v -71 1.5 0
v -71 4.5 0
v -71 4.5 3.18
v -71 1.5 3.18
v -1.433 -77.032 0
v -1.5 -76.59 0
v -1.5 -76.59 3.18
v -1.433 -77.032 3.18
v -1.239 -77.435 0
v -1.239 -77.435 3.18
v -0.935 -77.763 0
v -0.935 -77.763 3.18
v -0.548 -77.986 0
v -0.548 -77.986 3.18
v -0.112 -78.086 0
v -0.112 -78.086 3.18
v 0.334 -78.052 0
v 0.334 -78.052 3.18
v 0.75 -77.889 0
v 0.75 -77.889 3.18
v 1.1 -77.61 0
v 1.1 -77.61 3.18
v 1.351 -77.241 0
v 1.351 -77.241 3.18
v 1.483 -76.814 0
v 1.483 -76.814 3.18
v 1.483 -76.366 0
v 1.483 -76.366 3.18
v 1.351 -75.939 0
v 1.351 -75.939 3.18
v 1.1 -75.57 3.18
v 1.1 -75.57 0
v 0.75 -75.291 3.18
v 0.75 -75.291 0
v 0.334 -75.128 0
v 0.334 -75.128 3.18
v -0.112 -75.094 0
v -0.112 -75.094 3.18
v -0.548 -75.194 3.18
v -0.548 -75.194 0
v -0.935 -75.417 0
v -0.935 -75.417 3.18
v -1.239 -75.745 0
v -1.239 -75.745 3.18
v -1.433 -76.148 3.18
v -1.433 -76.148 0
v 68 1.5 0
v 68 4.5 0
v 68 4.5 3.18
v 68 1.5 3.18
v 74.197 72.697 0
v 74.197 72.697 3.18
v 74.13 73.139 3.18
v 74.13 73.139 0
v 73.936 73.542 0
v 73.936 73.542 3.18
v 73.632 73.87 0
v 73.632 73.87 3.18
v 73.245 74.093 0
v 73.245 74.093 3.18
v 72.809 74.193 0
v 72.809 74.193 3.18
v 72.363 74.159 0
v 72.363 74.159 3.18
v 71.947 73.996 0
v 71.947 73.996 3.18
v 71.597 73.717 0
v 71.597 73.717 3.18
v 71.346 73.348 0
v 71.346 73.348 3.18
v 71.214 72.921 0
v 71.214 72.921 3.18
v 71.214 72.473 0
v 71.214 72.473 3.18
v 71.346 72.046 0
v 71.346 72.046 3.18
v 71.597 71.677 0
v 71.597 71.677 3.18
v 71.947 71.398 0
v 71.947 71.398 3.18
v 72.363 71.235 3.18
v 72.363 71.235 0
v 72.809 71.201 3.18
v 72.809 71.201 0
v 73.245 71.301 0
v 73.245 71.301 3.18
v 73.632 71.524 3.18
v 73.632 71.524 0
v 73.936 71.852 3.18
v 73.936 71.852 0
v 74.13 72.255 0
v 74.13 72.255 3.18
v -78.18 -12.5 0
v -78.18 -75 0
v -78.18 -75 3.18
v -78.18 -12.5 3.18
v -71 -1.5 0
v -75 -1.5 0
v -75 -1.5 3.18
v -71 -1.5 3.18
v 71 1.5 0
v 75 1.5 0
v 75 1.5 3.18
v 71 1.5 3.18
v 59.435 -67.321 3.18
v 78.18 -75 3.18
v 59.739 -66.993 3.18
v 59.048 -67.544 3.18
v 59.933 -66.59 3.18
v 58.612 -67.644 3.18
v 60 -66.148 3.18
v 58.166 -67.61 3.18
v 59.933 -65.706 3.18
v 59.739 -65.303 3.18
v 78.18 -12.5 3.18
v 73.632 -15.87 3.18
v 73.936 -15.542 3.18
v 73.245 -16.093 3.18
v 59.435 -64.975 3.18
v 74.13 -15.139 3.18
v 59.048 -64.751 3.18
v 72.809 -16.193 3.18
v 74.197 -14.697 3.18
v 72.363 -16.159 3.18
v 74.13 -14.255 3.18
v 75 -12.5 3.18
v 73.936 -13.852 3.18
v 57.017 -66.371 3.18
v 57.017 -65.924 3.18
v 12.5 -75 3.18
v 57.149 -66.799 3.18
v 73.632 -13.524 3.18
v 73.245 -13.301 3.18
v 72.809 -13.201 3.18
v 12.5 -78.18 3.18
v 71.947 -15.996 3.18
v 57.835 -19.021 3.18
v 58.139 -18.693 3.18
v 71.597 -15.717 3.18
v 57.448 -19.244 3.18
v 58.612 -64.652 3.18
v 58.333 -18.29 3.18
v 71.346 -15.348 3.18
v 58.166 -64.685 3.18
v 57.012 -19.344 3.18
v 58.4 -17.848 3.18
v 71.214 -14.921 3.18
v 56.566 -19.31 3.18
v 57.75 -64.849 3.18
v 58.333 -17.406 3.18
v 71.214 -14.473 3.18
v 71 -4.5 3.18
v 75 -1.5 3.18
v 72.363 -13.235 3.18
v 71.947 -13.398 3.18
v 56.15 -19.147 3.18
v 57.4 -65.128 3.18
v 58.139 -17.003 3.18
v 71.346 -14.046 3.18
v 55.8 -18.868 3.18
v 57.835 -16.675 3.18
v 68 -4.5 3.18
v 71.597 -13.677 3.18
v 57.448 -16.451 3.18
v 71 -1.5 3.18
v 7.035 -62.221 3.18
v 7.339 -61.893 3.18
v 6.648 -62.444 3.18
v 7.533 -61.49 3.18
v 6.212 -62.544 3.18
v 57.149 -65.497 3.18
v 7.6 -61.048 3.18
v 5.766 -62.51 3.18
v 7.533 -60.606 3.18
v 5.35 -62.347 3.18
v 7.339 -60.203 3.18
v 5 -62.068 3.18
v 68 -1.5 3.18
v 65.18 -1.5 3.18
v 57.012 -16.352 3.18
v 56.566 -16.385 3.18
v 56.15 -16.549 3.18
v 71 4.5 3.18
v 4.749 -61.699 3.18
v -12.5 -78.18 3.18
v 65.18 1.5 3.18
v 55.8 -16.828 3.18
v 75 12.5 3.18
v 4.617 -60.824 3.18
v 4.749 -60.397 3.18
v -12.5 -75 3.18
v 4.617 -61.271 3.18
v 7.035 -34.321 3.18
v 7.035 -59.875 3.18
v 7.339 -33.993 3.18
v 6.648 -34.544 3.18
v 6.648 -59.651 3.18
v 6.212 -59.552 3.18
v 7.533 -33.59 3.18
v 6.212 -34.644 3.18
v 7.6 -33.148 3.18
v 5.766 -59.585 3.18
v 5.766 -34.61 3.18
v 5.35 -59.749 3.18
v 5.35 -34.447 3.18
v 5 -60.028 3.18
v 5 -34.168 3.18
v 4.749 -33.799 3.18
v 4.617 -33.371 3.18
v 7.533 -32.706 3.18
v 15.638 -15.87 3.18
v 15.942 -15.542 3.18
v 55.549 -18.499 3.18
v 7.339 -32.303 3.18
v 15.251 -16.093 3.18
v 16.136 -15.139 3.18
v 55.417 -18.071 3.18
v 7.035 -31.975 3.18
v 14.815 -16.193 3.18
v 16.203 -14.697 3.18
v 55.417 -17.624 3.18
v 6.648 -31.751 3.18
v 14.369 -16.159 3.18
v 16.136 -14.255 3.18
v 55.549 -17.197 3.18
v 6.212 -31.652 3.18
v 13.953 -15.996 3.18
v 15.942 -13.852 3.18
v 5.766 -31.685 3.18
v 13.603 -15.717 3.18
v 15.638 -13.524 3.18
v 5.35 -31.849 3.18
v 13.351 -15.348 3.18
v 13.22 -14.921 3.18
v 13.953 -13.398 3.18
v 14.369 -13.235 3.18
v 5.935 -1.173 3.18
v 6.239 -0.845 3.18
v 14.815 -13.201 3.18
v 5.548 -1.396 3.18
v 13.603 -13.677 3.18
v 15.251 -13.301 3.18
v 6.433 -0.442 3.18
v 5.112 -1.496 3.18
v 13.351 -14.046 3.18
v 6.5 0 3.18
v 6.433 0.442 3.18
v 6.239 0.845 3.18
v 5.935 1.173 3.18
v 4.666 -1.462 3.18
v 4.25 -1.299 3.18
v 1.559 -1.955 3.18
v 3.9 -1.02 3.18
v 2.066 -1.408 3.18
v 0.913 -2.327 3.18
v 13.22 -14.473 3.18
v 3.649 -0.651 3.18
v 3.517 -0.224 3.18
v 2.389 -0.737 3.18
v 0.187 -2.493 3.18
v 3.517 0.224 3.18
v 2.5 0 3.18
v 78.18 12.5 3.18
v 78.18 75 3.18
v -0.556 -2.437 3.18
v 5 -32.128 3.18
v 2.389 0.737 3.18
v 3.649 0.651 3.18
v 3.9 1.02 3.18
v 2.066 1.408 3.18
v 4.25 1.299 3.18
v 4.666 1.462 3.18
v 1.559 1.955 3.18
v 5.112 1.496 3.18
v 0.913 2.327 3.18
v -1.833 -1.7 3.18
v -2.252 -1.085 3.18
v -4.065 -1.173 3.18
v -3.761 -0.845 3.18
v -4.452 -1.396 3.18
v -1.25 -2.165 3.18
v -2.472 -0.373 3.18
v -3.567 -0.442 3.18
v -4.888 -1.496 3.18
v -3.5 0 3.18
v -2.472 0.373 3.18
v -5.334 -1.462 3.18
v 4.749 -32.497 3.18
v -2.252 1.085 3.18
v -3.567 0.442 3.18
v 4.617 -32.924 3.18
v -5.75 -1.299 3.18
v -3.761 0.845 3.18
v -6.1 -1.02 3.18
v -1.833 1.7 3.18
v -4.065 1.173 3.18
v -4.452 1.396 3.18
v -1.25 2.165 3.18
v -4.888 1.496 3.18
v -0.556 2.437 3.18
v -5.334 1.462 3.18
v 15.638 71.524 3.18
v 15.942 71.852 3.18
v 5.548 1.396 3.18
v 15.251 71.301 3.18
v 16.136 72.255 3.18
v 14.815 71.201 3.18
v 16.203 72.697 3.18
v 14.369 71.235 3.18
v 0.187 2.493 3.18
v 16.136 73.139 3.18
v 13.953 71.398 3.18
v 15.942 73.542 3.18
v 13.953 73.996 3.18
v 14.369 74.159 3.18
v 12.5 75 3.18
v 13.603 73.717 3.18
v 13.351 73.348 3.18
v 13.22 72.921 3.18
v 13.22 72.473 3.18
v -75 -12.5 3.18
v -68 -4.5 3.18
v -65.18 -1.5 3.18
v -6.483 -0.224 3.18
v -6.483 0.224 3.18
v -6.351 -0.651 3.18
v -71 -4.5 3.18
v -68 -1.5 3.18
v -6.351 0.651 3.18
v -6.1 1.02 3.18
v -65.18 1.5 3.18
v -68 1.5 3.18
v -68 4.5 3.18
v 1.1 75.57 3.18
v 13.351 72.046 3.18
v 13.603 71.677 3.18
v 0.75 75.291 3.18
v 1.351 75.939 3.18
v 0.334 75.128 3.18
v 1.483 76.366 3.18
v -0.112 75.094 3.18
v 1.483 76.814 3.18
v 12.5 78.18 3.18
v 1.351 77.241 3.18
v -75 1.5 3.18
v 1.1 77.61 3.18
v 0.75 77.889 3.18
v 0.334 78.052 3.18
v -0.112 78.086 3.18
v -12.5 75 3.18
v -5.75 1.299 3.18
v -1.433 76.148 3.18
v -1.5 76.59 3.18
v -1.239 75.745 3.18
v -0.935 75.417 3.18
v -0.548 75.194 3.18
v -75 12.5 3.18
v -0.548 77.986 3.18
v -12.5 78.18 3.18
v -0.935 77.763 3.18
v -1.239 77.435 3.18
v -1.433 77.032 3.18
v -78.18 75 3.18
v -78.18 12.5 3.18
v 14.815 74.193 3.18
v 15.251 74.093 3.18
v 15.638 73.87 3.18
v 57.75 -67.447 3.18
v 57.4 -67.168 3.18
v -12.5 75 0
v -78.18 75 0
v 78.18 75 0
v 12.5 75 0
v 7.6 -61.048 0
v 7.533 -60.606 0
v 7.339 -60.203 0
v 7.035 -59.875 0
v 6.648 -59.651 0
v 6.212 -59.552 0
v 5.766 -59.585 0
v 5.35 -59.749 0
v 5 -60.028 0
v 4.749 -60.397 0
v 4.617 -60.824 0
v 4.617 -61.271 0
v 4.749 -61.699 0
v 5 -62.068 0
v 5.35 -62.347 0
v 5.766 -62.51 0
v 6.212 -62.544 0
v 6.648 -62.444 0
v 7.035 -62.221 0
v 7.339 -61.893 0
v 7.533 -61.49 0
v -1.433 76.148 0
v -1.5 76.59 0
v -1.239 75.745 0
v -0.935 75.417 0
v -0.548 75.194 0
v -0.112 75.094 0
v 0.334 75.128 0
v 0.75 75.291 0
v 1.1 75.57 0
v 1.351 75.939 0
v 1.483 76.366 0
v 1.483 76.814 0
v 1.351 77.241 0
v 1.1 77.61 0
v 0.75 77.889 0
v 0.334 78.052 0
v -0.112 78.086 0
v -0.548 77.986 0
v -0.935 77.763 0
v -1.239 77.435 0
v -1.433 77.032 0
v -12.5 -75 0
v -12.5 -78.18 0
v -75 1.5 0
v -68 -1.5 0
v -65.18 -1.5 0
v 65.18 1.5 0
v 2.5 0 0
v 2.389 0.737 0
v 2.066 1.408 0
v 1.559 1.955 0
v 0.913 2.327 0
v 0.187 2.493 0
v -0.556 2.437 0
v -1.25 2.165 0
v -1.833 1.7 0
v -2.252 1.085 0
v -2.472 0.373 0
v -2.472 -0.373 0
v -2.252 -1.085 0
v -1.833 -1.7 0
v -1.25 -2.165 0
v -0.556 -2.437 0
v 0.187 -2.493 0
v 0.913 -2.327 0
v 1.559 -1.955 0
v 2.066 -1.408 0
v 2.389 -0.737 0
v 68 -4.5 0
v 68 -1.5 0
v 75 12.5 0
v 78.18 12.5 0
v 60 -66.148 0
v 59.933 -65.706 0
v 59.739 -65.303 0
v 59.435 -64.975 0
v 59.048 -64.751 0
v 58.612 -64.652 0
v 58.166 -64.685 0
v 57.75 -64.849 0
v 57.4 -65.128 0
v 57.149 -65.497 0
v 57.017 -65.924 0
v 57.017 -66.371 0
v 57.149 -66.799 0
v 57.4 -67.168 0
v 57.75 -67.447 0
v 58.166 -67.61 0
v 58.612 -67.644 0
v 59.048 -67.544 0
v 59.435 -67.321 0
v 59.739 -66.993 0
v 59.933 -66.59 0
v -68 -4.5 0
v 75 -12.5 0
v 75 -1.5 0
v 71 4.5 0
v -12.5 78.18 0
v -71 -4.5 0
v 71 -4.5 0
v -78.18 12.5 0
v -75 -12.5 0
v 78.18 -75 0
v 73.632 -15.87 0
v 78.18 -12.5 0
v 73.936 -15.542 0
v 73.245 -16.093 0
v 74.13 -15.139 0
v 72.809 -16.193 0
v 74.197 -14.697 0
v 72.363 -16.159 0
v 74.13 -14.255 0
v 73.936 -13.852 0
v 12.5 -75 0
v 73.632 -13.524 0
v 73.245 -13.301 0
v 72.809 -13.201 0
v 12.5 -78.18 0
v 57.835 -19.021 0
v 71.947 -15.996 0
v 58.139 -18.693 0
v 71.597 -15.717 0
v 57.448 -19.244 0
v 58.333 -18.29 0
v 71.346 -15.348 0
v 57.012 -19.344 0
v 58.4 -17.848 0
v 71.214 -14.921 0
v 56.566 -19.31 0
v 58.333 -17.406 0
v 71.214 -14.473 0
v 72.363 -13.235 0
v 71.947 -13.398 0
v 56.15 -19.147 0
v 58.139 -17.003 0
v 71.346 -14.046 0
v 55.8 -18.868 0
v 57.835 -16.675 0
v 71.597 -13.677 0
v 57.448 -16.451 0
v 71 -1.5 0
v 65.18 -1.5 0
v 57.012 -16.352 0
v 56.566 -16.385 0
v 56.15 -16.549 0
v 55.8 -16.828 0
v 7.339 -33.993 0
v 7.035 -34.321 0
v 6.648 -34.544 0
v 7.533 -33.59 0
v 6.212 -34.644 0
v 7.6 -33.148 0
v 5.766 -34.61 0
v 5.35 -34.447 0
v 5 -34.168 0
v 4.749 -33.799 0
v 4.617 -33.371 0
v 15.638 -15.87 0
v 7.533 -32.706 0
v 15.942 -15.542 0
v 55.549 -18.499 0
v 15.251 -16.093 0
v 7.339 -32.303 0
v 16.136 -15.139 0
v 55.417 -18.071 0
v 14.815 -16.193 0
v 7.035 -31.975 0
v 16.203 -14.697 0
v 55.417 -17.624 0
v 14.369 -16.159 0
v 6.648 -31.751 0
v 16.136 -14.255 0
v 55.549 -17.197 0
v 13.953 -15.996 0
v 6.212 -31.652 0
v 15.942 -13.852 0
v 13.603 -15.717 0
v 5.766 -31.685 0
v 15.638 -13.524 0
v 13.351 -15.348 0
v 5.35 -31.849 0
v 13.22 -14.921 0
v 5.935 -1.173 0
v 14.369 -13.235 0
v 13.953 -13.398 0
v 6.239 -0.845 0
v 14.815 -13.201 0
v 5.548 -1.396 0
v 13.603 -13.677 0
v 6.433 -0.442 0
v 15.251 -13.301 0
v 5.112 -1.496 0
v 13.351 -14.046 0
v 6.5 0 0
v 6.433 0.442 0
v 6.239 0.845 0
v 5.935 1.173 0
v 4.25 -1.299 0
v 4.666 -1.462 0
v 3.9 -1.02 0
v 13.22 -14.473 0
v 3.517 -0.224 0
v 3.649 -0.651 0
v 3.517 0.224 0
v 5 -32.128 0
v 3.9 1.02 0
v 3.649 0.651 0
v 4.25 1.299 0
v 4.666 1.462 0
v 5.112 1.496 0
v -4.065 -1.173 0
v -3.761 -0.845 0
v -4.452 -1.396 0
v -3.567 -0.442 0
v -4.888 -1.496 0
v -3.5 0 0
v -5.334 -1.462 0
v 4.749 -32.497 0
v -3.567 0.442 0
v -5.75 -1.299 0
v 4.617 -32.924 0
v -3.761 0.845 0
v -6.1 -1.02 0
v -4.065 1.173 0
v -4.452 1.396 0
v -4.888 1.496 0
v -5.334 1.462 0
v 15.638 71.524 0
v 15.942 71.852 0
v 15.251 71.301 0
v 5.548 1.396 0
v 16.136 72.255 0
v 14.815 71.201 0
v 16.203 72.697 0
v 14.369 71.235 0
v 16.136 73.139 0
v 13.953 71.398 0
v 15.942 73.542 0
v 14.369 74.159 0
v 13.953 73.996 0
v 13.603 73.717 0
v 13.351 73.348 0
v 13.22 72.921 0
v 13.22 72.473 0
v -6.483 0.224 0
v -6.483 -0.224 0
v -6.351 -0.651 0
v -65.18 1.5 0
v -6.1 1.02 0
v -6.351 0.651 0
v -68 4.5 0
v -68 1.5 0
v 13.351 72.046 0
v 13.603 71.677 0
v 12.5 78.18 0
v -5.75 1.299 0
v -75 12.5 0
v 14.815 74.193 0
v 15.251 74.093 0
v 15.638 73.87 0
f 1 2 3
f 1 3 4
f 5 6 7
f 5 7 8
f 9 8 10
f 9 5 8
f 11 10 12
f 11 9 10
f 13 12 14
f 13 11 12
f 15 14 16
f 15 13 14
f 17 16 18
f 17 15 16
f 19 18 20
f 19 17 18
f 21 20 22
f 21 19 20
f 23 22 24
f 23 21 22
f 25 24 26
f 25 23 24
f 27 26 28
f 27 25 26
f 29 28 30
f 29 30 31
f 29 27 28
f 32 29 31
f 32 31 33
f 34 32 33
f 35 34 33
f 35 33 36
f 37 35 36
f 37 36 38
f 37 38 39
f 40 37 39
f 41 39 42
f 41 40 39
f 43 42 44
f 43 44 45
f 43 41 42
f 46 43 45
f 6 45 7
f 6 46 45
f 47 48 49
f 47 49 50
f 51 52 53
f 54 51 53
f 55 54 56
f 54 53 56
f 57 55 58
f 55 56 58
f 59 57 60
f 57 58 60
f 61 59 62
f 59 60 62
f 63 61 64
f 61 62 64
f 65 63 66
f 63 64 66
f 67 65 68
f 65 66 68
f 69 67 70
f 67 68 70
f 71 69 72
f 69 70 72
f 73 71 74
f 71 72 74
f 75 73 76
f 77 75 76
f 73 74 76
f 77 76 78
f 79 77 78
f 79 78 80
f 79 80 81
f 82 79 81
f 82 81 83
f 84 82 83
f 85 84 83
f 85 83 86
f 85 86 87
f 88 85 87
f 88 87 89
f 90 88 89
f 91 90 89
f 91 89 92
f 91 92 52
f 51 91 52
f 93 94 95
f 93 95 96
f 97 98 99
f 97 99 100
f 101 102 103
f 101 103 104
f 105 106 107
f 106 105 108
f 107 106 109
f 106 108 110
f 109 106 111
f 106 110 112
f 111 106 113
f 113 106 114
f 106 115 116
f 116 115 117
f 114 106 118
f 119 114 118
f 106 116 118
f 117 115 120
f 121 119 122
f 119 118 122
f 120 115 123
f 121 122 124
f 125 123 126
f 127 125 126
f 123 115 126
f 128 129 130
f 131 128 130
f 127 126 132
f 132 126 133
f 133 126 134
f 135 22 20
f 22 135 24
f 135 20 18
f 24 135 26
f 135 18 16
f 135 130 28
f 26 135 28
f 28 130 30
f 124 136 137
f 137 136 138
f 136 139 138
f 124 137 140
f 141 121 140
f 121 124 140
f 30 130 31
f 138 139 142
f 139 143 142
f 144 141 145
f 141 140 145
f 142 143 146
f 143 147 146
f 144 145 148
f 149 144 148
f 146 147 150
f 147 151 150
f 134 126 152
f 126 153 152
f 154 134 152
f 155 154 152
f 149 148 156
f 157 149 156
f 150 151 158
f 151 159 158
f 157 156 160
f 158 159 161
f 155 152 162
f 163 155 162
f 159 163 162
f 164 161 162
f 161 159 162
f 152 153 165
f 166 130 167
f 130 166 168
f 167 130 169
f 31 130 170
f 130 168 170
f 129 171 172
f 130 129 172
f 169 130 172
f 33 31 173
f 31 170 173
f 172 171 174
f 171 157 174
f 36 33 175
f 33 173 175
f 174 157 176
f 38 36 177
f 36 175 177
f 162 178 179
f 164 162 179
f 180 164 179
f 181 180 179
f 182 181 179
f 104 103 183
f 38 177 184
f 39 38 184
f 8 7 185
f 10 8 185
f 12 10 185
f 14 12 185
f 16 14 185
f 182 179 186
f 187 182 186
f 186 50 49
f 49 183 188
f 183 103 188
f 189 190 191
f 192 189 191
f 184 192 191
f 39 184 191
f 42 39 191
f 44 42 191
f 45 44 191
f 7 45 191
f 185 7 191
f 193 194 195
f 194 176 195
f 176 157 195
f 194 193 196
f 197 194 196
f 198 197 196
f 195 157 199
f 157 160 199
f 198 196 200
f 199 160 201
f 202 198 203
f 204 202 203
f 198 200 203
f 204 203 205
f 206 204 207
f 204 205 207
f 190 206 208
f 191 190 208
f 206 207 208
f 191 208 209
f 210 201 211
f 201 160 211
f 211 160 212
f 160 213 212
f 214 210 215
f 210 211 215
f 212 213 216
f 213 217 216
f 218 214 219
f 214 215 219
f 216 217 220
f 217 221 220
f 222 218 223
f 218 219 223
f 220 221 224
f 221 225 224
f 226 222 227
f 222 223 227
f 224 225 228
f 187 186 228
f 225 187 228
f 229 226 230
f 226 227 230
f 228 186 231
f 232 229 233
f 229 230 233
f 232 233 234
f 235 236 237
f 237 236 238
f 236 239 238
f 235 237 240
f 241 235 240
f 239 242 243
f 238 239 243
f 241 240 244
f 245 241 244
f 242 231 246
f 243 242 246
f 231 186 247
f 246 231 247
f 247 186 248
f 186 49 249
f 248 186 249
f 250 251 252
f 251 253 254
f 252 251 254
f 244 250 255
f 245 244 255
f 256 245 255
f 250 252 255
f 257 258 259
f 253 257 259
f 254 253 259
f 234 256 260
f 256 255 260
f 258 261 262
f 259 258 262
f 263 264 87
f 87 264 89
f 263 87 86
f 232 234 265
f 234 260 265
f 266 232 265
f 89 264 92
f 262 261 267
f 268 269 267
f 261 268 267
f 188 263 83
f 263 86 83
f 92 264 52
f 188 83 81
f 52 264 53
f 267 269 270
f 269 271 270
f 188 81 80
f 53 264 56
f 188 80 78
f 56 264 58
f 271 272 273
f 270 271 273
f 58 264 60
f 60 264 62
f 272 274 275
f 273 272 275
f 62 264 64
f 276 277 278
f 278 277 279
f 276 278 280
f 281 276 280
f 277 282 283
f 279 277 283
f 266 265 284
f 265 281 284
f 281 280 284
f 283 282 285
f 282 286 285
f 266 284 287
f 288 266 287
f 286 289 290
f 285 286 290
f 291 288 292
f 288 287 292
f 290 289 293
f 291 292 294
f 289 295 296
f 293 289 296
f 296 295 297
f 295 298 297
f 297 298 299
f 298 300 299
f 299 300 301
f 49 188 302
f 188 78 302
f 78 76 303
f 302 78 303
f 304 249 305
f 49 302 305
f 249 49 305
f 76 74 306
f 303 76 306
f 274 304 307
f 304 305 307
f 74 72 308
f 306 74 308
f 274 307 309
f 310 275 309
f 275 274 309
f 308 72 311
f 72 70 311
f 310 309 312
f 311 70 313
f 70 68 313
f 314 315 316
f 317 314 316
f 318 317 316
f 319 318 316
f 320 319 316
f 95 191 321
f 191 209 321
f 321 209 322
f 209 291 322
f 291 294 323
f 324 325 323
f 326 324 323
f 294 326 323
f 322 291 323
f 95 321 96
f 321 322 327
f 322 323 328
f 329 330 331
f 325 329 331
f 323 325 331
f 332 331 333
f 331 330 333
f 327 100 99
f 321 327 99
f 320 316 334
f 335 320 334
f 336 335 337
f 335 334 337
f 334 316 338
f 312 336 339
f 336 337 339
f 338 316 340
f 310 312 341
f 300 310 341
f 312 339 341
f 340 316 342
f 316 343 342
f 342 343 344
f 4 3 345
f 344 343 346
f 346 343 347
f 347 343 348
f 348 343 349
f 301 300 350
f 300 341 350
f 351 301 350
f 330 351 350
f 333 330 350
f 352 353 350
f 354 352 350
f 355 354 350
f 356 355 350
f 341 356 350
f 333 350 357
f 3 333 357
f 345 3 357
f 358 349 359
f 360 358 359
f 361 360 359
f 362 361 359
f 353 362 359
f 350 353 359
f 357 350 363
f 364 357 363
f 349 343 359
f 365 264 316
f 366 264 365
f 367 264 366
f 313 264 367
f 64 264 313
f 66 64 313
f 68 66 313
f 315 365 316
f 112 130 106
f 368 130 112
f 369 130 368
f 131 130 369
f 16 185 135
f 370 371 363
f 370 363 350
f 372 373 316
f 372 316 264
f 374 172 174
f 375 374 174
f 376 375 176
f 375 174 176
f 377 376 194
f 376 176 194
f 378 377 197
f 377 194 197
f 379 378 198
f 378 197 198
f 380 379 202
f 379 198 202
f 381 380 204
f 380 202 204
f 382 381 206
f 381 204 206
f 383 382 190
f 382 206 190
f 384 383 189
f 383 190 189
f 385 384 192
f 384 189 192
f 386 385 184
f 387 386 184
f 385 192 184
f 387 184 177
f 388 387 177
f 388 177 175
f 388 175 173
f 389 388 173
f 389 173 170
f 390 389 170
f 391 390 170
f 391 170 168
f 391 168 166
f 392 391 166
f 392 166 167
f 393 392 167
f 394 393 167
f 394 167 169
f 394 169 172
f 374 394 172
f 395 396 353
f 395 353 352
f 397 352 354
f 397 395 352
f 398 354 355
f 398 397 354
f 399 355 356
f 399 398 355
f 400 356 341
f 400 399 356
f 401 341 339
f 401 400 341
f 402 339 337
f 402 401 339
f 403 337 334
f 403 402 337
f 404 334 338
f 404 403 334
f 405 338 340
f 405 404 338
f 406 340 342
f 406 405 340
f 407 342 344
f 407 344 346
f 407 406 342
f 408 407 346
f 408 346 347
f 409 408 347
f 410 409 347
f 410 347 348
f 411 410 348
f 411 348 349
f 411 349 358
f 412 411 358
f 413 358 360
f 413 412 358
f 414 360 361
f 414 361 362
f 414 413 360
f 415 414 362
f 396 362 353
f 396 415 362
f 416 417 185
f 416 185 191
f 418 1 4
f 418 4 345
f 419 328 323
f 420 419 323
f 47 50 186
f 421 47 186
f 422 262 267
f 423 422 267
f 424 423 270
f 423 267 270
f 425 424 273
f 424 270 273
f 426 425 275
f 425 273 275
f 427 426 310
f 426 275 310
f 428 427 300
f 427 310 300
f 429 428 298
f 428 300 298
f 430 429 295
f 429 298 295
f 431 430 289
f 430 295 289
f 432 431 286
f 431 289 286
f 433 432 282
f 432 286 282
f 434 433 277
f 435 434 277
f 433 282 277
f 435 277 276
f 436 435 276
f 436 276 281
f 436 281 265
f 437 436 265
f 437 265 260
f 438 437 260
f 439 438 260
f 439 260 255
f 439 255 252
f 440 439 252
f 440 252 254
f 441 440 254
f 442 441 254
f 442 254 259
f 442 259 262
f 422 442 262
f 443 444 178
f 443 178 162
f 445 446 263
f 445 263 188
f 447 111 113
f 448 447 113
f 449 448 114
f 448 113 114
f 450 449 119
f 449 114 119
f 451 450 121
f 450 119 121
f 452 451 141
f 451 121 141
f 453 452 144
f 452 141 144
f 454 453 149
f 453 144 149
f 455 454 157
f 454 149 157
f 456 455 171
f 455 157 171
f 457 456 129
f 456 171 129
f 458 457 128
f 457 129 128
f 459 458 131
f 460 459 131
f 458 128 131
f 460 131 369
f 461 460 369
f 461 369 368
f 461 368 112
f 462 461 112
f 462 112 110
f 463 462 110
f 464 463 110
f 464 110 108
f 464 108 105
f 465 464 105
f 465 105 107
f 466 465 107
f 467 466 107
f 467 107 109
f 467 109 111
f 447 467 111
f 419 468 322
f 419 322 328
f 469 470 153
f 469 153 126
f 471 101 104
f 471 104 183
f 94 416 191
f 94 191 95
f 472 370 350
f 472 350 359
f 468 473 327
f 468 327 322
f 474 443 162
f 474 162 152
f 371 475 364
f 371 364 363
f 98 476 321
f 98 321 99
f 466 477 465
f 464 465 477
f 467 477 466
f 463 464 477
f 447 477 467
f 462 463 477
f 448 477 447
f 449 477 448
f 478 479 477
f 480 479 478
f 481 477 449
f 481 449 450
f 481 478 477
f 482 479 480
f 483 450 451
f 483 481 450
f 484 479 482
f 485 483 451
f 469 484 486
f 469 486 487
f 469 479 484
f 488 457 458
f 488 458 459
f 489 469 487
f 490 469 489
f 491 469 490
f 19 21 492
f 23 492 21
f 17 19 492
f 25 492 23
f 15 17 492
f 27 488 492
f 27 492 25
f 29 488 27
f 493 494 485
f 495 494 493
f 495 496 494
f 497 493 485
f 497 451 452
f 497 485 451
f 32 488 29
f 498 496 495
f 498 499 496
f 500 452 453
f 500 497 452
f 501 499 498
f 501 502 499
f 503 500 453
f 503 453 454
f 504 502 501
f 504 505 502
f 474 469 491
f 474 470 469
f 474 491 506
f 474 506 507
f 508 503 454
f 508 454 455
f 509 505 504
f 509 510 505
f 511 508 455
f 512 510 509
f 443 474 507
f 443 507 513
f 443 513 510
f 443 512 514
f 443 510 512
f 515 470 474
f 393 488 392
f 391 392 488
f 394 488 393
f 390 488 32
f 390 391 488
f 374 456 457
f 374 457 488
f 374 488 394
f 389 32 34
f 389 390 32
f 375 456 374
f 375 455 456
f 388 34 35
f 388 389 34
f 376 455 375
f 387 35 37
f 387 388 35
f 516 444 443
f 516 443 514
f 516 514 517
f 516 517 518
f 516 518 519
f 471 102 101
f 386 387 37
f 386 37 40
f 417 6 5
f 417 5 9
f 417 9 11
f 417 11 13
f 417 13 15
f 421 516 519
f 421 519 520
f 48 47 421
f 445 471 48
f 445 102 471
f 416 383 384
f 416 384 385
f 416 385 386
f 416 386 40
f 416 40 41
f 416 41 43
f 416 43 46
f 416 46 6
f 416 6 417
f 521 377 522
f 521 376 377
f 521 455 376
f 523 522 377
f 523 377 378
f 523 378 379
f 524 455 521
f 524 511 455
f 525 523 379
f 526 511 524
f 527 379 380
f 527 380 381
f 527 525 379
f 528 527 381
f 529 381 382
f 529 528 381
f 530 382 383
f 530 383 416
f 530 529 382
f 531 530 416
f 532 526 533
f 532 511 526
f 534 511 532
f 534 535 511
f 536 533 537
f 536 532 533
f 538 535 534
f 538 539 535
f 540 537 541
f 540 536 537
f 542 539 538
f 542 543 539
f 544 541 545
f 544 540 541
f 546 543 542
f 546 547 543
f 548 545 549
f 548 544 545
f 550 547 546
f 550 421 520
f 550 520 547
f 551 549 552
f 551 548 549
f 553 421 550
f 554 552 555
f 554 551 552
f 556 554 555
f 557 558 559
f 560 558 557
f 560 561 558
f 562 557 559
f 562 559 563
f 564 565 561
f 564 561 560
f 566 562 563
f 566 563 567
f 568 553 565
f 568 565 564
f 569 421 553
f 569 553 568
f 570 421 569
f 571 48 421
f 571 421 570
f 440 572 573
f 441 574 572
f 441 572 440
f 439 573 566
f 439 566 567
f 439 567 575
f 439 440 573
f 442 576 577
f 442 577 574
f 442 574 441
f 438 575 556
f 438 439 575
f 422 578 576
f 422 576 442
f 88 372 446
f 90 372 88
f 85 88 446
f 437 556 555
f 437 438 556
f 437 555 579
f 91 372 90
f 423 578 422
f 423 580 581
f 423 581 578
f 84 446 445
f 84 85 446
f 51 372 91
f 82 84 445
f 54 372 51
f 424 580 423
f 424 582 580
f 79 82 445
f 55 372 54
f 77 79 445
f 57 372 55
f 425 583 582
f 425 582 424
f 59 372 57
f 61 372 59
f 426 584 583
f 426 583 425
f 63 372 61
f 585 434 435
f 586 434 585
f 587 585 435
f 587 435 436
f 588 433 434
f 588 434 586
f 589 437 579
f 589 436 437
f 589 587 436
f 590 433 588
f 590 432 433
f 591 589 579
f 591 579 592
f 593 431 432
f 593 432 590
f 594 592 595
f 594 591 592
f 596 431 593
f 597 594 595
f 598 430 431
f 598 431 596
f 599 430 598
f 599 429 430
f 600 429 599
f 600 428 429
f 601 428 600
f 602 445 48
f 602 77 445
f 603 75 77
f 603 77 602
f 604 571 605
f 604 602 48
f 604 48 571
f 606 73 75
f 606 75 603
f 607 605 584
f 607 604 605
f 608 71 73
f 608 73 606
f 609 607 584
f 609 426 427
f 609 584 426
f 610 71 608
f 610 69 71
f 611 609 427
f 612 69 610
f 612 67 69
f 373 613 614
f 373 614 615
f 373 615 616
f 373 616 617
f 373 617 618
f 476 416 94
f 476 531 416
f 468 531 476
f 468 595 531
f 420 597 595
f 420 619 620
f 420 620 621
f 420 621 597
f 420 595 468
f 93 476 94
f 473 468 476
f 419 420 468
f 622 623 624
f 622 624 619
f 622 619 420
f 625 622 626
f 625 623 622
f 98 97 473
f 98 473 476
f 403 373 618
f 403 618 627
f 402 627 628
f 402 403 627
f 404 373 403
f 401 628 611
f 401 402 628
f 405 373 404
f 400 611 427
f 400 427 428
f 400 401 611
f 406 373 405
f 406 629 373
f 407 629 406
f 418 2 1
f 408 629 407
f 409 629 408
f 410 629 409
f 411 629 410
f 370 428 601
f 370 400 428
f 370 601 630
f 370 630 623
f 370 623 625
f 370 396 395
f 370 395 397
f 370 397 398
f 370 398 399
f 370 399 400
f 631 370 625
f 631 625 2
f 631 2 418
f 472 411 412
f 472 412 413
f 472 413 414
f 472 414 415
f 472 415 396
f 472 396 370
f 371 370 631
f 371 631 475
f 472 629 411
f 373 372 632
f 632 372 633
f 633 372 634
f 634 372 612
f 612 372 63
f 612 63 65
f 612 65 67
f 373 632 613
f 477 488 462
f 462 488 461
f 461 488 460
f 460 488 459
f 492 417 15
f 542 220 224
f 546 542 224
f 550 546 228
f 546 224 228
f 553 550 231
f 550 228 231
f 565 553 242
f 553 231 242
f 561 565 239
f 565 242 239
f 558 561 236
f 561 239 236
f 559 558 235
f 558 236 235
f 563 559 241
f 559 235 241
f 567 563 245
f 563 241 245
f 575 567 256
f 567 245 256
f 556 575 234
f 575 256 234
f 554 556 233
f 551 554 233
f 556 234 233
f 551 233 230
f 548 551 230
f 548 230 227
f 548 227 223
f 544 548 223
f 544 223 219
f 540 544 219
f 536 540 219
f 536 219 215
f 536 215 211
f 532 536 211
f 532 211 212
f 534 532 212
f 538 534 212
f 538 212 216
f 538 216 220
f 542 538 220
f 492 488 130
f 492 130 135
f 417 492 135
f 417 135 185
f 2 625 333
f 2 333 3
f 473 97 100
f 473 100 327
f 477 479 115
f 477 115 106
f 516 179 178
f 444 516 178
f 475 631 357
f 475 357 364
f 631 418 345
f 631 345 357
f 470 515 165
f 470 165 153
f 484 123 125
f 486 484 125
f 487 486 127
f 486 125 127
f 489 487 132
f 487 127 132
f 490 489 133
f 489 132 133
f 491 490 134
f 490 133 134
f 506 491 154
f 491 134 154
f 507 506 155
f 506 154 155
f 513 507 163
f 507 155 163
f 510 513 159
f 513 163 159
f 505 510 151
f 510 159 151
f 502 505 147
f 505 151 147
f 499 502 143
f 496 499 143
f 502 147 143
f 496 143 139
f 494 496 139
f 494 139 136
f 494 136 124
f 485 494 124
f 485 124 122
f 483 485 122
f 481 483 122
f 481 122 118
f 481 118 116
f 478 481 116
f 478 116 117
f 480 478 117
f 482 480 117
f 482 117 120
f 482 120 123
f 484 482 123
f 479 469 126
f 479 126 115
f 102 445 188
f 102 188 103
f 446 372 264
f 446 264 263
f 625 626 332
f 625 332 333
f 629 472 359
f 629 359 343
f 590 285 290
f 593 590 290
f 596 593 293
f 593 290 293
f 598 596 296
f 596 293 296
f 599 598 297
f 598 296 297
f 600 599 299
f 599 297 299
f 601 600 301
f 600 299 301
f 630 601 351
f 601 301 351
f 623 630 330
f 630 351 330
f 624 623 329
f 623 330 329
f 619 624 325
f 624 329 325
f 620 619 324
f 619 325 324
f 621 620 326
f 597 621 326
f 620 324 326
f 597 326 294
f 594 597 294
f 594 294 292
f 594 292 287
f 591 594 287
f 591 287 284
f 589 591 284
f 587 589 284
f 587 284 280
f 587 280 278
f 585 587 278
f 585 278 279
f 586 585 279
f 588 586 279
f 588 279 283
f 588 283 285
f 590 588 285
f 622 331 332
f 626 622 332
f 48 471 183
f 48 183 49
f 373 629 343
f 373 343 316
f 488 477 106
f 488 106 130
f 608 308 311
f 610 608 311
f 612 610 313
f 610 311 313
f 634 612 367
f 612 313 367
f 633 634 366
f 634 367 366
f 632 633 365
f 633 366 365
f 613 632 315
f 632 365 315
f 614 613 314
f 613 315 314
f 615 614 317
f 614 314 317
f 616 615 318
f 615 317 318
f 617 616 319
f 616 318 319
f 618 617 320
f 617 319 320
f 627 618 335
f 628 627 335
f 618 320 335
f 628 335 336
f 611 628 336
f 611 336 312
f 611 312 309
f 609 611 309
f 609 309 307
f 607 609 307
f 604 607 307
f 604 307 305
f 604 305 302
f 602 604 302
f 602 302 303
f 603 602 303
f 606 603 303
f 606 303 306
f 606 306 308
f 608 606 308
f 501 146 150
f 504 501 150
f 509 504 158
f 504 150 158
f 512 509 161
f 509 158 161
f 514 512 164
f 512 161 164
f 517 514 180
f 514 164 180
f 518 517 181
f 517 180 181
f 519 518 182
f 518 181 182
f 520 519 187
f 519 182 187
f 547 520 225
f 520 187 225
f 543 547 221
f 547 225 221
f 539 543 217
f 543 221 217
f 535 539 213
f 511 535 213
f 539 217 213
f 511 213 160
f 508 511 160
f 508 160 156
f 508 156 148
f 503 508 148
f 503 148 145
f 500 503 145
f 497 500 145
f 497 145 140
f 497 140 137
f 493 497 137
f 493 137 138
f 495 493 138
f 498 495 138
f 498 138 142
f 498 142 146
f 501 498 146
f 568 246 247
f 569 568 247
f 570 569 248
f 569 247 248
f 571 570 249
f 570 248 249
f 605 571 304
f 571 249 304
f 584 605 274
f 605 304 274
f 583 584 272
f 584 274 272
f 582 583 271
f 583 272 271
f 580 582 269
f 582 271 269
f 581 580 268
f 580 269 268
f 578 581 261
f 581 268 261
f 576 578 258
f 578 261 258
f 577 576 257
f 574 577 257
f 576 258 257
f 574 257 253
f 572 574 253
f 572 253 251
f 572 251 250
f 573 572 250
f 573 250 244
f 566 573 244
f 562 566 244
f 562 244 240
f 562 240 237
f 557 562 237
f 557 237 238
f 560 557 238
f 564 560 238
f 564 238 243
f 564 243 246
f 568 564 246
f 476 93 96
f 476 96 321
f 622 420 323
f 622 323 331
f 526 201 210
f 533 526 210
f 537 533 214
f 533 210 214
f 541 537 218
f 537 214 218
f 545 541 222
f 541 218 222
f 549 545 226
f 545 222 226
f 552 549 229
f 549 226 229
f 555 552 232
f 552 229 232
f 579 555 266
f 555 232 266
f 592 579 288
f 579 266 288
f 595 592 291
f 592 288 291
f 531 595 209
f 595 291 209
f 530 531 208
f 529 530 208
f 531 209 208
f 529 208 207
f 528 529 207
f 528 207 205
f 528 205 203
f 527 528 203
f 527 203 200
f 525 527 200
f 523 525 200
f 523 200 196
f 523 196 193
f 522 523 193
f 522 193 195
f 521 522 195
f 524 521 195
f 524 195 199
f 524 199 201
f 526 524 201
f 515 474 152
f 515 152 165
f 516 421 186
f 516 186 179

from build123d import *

# Parameters (mm, degrees)
SKETCH1_R           = 1.5
BOSS_EXTRUDE1_DEPTH = 3.18
SKETCH2_R           = 2.5
SKETCH2_R_2         = 1.5
CUT_EXTRUDE1_DEPTH  = 20
SKETCH3_R           = 1.5
CUT_EXTRUDE2_DEPTH  = 20
SKETCH5_R           = 1.5
CUT_EXTRUDE4_DEPTH  = 4


with BuildPart() as part:
    # Sketch1 → Boss-Extrude1 (new body)
    with BuildSketch(Plane.XY):
        Polygon((-78.18, 75), (-12.5, 75), (-12.5, 78.18), (12.5, 78.18), (12.5, 75), (78.18, 75), (78.18, 12.5), (75, 12.5), (75, 1.5), (71, 1.5), (71, 4.5), (68, 4.5), (68, 1.5), (65.18, 1.5), (65.18, -1.5), (68, -1.5), (68, -4.5), (71, -4.5), (71, -1.5), (75, -1.5), (75, -12.5), (78.18, -12.5), (78.18, -75), (12.5, -75), (12.5, -78.18), (-12.5, -78.18), (-12.5, -75), (-78.18, -75), (-78.18, -12.5), (-75, -12.5), (-75, -1.5), (-71, -1.5), (-71, -4.5), (-68, -4.5), (-68, -1.5), (-65.18, -1.5), (-65.18, 1.5), (-68, 1.5), (-68, 4.5), (-71, 4.5), (-71, 1.5), (-75, 1.5), (-75, 12.5), (-78.18, 12.5), align=None)
        with Locations(Location((0, -76.59, 0), (0, 0, 180))):
            Circle(SKETCH1_R, mode=Mode.SUBTRACT)
        with Locations(Location((0, 76.59, 0), (0, 0, 180))):
            Circle(SKETCH1_R, mode=Mode.SUBTRACT)
    extrude(amount=BOSS_EXTRUDE1_DEPTH)

    # Sketch2 → Cut-Extrude1 (cut)
    with BuildSketch(Plane.XY.offset(3.18)):
        Circle(SKETCH2_R)
        with Locations((-5, 0)):
            Circle(SKETCH2_R_2)
        with Locations((5, 0)):
            Circle(SKETCH2_R_2)
    extrude(amount=-CUT_EXTRUDE1_DEPTH, mode=Mode.SUBTRACT)

    # Sketch3 → Cut-Extrude2 (cut)
    with BuildSketch(Plane.XY.offset(3.18)):
        with Locations((56.9, -17.847779645)):
            Circle(SKETCH3_R)
        with Locations((58.5, -66.147779645)):
            Circle(SKETCH3_R)
        with Locations((6.1, -33.147779645)):
            Circle(SKETCH3_R)
        with Locations((6.1, -61.047779645)):
            Circle(SKETCH3_R)
    extrude(amount=-CUT_EXTRUDE2_DEPTH, mode=Mode.SUBTRACT)

    # Sketch5 → Cut-Extrude4 (cut)
    with BuildSketch(Plane.XY.offset(3.18)):
        with Locations((14.702943725, 72.697056275)):
            Circle(SKETCH5_R)
        with Locations((72.697056275, 72.697056275)):
            Circle(SKETCH5_R)
        with Locations((14.702943725, -14.697056275)):
            Circle(SKETCH5_R)
        with Locations((72.697056275, -14.697056275)):
            Circle(SKETCH5_R)
    extrude(amount=-CUT_EXTRUDE4_DEPTH, mode=Mode.SUBTRACT)


solid = part.part
